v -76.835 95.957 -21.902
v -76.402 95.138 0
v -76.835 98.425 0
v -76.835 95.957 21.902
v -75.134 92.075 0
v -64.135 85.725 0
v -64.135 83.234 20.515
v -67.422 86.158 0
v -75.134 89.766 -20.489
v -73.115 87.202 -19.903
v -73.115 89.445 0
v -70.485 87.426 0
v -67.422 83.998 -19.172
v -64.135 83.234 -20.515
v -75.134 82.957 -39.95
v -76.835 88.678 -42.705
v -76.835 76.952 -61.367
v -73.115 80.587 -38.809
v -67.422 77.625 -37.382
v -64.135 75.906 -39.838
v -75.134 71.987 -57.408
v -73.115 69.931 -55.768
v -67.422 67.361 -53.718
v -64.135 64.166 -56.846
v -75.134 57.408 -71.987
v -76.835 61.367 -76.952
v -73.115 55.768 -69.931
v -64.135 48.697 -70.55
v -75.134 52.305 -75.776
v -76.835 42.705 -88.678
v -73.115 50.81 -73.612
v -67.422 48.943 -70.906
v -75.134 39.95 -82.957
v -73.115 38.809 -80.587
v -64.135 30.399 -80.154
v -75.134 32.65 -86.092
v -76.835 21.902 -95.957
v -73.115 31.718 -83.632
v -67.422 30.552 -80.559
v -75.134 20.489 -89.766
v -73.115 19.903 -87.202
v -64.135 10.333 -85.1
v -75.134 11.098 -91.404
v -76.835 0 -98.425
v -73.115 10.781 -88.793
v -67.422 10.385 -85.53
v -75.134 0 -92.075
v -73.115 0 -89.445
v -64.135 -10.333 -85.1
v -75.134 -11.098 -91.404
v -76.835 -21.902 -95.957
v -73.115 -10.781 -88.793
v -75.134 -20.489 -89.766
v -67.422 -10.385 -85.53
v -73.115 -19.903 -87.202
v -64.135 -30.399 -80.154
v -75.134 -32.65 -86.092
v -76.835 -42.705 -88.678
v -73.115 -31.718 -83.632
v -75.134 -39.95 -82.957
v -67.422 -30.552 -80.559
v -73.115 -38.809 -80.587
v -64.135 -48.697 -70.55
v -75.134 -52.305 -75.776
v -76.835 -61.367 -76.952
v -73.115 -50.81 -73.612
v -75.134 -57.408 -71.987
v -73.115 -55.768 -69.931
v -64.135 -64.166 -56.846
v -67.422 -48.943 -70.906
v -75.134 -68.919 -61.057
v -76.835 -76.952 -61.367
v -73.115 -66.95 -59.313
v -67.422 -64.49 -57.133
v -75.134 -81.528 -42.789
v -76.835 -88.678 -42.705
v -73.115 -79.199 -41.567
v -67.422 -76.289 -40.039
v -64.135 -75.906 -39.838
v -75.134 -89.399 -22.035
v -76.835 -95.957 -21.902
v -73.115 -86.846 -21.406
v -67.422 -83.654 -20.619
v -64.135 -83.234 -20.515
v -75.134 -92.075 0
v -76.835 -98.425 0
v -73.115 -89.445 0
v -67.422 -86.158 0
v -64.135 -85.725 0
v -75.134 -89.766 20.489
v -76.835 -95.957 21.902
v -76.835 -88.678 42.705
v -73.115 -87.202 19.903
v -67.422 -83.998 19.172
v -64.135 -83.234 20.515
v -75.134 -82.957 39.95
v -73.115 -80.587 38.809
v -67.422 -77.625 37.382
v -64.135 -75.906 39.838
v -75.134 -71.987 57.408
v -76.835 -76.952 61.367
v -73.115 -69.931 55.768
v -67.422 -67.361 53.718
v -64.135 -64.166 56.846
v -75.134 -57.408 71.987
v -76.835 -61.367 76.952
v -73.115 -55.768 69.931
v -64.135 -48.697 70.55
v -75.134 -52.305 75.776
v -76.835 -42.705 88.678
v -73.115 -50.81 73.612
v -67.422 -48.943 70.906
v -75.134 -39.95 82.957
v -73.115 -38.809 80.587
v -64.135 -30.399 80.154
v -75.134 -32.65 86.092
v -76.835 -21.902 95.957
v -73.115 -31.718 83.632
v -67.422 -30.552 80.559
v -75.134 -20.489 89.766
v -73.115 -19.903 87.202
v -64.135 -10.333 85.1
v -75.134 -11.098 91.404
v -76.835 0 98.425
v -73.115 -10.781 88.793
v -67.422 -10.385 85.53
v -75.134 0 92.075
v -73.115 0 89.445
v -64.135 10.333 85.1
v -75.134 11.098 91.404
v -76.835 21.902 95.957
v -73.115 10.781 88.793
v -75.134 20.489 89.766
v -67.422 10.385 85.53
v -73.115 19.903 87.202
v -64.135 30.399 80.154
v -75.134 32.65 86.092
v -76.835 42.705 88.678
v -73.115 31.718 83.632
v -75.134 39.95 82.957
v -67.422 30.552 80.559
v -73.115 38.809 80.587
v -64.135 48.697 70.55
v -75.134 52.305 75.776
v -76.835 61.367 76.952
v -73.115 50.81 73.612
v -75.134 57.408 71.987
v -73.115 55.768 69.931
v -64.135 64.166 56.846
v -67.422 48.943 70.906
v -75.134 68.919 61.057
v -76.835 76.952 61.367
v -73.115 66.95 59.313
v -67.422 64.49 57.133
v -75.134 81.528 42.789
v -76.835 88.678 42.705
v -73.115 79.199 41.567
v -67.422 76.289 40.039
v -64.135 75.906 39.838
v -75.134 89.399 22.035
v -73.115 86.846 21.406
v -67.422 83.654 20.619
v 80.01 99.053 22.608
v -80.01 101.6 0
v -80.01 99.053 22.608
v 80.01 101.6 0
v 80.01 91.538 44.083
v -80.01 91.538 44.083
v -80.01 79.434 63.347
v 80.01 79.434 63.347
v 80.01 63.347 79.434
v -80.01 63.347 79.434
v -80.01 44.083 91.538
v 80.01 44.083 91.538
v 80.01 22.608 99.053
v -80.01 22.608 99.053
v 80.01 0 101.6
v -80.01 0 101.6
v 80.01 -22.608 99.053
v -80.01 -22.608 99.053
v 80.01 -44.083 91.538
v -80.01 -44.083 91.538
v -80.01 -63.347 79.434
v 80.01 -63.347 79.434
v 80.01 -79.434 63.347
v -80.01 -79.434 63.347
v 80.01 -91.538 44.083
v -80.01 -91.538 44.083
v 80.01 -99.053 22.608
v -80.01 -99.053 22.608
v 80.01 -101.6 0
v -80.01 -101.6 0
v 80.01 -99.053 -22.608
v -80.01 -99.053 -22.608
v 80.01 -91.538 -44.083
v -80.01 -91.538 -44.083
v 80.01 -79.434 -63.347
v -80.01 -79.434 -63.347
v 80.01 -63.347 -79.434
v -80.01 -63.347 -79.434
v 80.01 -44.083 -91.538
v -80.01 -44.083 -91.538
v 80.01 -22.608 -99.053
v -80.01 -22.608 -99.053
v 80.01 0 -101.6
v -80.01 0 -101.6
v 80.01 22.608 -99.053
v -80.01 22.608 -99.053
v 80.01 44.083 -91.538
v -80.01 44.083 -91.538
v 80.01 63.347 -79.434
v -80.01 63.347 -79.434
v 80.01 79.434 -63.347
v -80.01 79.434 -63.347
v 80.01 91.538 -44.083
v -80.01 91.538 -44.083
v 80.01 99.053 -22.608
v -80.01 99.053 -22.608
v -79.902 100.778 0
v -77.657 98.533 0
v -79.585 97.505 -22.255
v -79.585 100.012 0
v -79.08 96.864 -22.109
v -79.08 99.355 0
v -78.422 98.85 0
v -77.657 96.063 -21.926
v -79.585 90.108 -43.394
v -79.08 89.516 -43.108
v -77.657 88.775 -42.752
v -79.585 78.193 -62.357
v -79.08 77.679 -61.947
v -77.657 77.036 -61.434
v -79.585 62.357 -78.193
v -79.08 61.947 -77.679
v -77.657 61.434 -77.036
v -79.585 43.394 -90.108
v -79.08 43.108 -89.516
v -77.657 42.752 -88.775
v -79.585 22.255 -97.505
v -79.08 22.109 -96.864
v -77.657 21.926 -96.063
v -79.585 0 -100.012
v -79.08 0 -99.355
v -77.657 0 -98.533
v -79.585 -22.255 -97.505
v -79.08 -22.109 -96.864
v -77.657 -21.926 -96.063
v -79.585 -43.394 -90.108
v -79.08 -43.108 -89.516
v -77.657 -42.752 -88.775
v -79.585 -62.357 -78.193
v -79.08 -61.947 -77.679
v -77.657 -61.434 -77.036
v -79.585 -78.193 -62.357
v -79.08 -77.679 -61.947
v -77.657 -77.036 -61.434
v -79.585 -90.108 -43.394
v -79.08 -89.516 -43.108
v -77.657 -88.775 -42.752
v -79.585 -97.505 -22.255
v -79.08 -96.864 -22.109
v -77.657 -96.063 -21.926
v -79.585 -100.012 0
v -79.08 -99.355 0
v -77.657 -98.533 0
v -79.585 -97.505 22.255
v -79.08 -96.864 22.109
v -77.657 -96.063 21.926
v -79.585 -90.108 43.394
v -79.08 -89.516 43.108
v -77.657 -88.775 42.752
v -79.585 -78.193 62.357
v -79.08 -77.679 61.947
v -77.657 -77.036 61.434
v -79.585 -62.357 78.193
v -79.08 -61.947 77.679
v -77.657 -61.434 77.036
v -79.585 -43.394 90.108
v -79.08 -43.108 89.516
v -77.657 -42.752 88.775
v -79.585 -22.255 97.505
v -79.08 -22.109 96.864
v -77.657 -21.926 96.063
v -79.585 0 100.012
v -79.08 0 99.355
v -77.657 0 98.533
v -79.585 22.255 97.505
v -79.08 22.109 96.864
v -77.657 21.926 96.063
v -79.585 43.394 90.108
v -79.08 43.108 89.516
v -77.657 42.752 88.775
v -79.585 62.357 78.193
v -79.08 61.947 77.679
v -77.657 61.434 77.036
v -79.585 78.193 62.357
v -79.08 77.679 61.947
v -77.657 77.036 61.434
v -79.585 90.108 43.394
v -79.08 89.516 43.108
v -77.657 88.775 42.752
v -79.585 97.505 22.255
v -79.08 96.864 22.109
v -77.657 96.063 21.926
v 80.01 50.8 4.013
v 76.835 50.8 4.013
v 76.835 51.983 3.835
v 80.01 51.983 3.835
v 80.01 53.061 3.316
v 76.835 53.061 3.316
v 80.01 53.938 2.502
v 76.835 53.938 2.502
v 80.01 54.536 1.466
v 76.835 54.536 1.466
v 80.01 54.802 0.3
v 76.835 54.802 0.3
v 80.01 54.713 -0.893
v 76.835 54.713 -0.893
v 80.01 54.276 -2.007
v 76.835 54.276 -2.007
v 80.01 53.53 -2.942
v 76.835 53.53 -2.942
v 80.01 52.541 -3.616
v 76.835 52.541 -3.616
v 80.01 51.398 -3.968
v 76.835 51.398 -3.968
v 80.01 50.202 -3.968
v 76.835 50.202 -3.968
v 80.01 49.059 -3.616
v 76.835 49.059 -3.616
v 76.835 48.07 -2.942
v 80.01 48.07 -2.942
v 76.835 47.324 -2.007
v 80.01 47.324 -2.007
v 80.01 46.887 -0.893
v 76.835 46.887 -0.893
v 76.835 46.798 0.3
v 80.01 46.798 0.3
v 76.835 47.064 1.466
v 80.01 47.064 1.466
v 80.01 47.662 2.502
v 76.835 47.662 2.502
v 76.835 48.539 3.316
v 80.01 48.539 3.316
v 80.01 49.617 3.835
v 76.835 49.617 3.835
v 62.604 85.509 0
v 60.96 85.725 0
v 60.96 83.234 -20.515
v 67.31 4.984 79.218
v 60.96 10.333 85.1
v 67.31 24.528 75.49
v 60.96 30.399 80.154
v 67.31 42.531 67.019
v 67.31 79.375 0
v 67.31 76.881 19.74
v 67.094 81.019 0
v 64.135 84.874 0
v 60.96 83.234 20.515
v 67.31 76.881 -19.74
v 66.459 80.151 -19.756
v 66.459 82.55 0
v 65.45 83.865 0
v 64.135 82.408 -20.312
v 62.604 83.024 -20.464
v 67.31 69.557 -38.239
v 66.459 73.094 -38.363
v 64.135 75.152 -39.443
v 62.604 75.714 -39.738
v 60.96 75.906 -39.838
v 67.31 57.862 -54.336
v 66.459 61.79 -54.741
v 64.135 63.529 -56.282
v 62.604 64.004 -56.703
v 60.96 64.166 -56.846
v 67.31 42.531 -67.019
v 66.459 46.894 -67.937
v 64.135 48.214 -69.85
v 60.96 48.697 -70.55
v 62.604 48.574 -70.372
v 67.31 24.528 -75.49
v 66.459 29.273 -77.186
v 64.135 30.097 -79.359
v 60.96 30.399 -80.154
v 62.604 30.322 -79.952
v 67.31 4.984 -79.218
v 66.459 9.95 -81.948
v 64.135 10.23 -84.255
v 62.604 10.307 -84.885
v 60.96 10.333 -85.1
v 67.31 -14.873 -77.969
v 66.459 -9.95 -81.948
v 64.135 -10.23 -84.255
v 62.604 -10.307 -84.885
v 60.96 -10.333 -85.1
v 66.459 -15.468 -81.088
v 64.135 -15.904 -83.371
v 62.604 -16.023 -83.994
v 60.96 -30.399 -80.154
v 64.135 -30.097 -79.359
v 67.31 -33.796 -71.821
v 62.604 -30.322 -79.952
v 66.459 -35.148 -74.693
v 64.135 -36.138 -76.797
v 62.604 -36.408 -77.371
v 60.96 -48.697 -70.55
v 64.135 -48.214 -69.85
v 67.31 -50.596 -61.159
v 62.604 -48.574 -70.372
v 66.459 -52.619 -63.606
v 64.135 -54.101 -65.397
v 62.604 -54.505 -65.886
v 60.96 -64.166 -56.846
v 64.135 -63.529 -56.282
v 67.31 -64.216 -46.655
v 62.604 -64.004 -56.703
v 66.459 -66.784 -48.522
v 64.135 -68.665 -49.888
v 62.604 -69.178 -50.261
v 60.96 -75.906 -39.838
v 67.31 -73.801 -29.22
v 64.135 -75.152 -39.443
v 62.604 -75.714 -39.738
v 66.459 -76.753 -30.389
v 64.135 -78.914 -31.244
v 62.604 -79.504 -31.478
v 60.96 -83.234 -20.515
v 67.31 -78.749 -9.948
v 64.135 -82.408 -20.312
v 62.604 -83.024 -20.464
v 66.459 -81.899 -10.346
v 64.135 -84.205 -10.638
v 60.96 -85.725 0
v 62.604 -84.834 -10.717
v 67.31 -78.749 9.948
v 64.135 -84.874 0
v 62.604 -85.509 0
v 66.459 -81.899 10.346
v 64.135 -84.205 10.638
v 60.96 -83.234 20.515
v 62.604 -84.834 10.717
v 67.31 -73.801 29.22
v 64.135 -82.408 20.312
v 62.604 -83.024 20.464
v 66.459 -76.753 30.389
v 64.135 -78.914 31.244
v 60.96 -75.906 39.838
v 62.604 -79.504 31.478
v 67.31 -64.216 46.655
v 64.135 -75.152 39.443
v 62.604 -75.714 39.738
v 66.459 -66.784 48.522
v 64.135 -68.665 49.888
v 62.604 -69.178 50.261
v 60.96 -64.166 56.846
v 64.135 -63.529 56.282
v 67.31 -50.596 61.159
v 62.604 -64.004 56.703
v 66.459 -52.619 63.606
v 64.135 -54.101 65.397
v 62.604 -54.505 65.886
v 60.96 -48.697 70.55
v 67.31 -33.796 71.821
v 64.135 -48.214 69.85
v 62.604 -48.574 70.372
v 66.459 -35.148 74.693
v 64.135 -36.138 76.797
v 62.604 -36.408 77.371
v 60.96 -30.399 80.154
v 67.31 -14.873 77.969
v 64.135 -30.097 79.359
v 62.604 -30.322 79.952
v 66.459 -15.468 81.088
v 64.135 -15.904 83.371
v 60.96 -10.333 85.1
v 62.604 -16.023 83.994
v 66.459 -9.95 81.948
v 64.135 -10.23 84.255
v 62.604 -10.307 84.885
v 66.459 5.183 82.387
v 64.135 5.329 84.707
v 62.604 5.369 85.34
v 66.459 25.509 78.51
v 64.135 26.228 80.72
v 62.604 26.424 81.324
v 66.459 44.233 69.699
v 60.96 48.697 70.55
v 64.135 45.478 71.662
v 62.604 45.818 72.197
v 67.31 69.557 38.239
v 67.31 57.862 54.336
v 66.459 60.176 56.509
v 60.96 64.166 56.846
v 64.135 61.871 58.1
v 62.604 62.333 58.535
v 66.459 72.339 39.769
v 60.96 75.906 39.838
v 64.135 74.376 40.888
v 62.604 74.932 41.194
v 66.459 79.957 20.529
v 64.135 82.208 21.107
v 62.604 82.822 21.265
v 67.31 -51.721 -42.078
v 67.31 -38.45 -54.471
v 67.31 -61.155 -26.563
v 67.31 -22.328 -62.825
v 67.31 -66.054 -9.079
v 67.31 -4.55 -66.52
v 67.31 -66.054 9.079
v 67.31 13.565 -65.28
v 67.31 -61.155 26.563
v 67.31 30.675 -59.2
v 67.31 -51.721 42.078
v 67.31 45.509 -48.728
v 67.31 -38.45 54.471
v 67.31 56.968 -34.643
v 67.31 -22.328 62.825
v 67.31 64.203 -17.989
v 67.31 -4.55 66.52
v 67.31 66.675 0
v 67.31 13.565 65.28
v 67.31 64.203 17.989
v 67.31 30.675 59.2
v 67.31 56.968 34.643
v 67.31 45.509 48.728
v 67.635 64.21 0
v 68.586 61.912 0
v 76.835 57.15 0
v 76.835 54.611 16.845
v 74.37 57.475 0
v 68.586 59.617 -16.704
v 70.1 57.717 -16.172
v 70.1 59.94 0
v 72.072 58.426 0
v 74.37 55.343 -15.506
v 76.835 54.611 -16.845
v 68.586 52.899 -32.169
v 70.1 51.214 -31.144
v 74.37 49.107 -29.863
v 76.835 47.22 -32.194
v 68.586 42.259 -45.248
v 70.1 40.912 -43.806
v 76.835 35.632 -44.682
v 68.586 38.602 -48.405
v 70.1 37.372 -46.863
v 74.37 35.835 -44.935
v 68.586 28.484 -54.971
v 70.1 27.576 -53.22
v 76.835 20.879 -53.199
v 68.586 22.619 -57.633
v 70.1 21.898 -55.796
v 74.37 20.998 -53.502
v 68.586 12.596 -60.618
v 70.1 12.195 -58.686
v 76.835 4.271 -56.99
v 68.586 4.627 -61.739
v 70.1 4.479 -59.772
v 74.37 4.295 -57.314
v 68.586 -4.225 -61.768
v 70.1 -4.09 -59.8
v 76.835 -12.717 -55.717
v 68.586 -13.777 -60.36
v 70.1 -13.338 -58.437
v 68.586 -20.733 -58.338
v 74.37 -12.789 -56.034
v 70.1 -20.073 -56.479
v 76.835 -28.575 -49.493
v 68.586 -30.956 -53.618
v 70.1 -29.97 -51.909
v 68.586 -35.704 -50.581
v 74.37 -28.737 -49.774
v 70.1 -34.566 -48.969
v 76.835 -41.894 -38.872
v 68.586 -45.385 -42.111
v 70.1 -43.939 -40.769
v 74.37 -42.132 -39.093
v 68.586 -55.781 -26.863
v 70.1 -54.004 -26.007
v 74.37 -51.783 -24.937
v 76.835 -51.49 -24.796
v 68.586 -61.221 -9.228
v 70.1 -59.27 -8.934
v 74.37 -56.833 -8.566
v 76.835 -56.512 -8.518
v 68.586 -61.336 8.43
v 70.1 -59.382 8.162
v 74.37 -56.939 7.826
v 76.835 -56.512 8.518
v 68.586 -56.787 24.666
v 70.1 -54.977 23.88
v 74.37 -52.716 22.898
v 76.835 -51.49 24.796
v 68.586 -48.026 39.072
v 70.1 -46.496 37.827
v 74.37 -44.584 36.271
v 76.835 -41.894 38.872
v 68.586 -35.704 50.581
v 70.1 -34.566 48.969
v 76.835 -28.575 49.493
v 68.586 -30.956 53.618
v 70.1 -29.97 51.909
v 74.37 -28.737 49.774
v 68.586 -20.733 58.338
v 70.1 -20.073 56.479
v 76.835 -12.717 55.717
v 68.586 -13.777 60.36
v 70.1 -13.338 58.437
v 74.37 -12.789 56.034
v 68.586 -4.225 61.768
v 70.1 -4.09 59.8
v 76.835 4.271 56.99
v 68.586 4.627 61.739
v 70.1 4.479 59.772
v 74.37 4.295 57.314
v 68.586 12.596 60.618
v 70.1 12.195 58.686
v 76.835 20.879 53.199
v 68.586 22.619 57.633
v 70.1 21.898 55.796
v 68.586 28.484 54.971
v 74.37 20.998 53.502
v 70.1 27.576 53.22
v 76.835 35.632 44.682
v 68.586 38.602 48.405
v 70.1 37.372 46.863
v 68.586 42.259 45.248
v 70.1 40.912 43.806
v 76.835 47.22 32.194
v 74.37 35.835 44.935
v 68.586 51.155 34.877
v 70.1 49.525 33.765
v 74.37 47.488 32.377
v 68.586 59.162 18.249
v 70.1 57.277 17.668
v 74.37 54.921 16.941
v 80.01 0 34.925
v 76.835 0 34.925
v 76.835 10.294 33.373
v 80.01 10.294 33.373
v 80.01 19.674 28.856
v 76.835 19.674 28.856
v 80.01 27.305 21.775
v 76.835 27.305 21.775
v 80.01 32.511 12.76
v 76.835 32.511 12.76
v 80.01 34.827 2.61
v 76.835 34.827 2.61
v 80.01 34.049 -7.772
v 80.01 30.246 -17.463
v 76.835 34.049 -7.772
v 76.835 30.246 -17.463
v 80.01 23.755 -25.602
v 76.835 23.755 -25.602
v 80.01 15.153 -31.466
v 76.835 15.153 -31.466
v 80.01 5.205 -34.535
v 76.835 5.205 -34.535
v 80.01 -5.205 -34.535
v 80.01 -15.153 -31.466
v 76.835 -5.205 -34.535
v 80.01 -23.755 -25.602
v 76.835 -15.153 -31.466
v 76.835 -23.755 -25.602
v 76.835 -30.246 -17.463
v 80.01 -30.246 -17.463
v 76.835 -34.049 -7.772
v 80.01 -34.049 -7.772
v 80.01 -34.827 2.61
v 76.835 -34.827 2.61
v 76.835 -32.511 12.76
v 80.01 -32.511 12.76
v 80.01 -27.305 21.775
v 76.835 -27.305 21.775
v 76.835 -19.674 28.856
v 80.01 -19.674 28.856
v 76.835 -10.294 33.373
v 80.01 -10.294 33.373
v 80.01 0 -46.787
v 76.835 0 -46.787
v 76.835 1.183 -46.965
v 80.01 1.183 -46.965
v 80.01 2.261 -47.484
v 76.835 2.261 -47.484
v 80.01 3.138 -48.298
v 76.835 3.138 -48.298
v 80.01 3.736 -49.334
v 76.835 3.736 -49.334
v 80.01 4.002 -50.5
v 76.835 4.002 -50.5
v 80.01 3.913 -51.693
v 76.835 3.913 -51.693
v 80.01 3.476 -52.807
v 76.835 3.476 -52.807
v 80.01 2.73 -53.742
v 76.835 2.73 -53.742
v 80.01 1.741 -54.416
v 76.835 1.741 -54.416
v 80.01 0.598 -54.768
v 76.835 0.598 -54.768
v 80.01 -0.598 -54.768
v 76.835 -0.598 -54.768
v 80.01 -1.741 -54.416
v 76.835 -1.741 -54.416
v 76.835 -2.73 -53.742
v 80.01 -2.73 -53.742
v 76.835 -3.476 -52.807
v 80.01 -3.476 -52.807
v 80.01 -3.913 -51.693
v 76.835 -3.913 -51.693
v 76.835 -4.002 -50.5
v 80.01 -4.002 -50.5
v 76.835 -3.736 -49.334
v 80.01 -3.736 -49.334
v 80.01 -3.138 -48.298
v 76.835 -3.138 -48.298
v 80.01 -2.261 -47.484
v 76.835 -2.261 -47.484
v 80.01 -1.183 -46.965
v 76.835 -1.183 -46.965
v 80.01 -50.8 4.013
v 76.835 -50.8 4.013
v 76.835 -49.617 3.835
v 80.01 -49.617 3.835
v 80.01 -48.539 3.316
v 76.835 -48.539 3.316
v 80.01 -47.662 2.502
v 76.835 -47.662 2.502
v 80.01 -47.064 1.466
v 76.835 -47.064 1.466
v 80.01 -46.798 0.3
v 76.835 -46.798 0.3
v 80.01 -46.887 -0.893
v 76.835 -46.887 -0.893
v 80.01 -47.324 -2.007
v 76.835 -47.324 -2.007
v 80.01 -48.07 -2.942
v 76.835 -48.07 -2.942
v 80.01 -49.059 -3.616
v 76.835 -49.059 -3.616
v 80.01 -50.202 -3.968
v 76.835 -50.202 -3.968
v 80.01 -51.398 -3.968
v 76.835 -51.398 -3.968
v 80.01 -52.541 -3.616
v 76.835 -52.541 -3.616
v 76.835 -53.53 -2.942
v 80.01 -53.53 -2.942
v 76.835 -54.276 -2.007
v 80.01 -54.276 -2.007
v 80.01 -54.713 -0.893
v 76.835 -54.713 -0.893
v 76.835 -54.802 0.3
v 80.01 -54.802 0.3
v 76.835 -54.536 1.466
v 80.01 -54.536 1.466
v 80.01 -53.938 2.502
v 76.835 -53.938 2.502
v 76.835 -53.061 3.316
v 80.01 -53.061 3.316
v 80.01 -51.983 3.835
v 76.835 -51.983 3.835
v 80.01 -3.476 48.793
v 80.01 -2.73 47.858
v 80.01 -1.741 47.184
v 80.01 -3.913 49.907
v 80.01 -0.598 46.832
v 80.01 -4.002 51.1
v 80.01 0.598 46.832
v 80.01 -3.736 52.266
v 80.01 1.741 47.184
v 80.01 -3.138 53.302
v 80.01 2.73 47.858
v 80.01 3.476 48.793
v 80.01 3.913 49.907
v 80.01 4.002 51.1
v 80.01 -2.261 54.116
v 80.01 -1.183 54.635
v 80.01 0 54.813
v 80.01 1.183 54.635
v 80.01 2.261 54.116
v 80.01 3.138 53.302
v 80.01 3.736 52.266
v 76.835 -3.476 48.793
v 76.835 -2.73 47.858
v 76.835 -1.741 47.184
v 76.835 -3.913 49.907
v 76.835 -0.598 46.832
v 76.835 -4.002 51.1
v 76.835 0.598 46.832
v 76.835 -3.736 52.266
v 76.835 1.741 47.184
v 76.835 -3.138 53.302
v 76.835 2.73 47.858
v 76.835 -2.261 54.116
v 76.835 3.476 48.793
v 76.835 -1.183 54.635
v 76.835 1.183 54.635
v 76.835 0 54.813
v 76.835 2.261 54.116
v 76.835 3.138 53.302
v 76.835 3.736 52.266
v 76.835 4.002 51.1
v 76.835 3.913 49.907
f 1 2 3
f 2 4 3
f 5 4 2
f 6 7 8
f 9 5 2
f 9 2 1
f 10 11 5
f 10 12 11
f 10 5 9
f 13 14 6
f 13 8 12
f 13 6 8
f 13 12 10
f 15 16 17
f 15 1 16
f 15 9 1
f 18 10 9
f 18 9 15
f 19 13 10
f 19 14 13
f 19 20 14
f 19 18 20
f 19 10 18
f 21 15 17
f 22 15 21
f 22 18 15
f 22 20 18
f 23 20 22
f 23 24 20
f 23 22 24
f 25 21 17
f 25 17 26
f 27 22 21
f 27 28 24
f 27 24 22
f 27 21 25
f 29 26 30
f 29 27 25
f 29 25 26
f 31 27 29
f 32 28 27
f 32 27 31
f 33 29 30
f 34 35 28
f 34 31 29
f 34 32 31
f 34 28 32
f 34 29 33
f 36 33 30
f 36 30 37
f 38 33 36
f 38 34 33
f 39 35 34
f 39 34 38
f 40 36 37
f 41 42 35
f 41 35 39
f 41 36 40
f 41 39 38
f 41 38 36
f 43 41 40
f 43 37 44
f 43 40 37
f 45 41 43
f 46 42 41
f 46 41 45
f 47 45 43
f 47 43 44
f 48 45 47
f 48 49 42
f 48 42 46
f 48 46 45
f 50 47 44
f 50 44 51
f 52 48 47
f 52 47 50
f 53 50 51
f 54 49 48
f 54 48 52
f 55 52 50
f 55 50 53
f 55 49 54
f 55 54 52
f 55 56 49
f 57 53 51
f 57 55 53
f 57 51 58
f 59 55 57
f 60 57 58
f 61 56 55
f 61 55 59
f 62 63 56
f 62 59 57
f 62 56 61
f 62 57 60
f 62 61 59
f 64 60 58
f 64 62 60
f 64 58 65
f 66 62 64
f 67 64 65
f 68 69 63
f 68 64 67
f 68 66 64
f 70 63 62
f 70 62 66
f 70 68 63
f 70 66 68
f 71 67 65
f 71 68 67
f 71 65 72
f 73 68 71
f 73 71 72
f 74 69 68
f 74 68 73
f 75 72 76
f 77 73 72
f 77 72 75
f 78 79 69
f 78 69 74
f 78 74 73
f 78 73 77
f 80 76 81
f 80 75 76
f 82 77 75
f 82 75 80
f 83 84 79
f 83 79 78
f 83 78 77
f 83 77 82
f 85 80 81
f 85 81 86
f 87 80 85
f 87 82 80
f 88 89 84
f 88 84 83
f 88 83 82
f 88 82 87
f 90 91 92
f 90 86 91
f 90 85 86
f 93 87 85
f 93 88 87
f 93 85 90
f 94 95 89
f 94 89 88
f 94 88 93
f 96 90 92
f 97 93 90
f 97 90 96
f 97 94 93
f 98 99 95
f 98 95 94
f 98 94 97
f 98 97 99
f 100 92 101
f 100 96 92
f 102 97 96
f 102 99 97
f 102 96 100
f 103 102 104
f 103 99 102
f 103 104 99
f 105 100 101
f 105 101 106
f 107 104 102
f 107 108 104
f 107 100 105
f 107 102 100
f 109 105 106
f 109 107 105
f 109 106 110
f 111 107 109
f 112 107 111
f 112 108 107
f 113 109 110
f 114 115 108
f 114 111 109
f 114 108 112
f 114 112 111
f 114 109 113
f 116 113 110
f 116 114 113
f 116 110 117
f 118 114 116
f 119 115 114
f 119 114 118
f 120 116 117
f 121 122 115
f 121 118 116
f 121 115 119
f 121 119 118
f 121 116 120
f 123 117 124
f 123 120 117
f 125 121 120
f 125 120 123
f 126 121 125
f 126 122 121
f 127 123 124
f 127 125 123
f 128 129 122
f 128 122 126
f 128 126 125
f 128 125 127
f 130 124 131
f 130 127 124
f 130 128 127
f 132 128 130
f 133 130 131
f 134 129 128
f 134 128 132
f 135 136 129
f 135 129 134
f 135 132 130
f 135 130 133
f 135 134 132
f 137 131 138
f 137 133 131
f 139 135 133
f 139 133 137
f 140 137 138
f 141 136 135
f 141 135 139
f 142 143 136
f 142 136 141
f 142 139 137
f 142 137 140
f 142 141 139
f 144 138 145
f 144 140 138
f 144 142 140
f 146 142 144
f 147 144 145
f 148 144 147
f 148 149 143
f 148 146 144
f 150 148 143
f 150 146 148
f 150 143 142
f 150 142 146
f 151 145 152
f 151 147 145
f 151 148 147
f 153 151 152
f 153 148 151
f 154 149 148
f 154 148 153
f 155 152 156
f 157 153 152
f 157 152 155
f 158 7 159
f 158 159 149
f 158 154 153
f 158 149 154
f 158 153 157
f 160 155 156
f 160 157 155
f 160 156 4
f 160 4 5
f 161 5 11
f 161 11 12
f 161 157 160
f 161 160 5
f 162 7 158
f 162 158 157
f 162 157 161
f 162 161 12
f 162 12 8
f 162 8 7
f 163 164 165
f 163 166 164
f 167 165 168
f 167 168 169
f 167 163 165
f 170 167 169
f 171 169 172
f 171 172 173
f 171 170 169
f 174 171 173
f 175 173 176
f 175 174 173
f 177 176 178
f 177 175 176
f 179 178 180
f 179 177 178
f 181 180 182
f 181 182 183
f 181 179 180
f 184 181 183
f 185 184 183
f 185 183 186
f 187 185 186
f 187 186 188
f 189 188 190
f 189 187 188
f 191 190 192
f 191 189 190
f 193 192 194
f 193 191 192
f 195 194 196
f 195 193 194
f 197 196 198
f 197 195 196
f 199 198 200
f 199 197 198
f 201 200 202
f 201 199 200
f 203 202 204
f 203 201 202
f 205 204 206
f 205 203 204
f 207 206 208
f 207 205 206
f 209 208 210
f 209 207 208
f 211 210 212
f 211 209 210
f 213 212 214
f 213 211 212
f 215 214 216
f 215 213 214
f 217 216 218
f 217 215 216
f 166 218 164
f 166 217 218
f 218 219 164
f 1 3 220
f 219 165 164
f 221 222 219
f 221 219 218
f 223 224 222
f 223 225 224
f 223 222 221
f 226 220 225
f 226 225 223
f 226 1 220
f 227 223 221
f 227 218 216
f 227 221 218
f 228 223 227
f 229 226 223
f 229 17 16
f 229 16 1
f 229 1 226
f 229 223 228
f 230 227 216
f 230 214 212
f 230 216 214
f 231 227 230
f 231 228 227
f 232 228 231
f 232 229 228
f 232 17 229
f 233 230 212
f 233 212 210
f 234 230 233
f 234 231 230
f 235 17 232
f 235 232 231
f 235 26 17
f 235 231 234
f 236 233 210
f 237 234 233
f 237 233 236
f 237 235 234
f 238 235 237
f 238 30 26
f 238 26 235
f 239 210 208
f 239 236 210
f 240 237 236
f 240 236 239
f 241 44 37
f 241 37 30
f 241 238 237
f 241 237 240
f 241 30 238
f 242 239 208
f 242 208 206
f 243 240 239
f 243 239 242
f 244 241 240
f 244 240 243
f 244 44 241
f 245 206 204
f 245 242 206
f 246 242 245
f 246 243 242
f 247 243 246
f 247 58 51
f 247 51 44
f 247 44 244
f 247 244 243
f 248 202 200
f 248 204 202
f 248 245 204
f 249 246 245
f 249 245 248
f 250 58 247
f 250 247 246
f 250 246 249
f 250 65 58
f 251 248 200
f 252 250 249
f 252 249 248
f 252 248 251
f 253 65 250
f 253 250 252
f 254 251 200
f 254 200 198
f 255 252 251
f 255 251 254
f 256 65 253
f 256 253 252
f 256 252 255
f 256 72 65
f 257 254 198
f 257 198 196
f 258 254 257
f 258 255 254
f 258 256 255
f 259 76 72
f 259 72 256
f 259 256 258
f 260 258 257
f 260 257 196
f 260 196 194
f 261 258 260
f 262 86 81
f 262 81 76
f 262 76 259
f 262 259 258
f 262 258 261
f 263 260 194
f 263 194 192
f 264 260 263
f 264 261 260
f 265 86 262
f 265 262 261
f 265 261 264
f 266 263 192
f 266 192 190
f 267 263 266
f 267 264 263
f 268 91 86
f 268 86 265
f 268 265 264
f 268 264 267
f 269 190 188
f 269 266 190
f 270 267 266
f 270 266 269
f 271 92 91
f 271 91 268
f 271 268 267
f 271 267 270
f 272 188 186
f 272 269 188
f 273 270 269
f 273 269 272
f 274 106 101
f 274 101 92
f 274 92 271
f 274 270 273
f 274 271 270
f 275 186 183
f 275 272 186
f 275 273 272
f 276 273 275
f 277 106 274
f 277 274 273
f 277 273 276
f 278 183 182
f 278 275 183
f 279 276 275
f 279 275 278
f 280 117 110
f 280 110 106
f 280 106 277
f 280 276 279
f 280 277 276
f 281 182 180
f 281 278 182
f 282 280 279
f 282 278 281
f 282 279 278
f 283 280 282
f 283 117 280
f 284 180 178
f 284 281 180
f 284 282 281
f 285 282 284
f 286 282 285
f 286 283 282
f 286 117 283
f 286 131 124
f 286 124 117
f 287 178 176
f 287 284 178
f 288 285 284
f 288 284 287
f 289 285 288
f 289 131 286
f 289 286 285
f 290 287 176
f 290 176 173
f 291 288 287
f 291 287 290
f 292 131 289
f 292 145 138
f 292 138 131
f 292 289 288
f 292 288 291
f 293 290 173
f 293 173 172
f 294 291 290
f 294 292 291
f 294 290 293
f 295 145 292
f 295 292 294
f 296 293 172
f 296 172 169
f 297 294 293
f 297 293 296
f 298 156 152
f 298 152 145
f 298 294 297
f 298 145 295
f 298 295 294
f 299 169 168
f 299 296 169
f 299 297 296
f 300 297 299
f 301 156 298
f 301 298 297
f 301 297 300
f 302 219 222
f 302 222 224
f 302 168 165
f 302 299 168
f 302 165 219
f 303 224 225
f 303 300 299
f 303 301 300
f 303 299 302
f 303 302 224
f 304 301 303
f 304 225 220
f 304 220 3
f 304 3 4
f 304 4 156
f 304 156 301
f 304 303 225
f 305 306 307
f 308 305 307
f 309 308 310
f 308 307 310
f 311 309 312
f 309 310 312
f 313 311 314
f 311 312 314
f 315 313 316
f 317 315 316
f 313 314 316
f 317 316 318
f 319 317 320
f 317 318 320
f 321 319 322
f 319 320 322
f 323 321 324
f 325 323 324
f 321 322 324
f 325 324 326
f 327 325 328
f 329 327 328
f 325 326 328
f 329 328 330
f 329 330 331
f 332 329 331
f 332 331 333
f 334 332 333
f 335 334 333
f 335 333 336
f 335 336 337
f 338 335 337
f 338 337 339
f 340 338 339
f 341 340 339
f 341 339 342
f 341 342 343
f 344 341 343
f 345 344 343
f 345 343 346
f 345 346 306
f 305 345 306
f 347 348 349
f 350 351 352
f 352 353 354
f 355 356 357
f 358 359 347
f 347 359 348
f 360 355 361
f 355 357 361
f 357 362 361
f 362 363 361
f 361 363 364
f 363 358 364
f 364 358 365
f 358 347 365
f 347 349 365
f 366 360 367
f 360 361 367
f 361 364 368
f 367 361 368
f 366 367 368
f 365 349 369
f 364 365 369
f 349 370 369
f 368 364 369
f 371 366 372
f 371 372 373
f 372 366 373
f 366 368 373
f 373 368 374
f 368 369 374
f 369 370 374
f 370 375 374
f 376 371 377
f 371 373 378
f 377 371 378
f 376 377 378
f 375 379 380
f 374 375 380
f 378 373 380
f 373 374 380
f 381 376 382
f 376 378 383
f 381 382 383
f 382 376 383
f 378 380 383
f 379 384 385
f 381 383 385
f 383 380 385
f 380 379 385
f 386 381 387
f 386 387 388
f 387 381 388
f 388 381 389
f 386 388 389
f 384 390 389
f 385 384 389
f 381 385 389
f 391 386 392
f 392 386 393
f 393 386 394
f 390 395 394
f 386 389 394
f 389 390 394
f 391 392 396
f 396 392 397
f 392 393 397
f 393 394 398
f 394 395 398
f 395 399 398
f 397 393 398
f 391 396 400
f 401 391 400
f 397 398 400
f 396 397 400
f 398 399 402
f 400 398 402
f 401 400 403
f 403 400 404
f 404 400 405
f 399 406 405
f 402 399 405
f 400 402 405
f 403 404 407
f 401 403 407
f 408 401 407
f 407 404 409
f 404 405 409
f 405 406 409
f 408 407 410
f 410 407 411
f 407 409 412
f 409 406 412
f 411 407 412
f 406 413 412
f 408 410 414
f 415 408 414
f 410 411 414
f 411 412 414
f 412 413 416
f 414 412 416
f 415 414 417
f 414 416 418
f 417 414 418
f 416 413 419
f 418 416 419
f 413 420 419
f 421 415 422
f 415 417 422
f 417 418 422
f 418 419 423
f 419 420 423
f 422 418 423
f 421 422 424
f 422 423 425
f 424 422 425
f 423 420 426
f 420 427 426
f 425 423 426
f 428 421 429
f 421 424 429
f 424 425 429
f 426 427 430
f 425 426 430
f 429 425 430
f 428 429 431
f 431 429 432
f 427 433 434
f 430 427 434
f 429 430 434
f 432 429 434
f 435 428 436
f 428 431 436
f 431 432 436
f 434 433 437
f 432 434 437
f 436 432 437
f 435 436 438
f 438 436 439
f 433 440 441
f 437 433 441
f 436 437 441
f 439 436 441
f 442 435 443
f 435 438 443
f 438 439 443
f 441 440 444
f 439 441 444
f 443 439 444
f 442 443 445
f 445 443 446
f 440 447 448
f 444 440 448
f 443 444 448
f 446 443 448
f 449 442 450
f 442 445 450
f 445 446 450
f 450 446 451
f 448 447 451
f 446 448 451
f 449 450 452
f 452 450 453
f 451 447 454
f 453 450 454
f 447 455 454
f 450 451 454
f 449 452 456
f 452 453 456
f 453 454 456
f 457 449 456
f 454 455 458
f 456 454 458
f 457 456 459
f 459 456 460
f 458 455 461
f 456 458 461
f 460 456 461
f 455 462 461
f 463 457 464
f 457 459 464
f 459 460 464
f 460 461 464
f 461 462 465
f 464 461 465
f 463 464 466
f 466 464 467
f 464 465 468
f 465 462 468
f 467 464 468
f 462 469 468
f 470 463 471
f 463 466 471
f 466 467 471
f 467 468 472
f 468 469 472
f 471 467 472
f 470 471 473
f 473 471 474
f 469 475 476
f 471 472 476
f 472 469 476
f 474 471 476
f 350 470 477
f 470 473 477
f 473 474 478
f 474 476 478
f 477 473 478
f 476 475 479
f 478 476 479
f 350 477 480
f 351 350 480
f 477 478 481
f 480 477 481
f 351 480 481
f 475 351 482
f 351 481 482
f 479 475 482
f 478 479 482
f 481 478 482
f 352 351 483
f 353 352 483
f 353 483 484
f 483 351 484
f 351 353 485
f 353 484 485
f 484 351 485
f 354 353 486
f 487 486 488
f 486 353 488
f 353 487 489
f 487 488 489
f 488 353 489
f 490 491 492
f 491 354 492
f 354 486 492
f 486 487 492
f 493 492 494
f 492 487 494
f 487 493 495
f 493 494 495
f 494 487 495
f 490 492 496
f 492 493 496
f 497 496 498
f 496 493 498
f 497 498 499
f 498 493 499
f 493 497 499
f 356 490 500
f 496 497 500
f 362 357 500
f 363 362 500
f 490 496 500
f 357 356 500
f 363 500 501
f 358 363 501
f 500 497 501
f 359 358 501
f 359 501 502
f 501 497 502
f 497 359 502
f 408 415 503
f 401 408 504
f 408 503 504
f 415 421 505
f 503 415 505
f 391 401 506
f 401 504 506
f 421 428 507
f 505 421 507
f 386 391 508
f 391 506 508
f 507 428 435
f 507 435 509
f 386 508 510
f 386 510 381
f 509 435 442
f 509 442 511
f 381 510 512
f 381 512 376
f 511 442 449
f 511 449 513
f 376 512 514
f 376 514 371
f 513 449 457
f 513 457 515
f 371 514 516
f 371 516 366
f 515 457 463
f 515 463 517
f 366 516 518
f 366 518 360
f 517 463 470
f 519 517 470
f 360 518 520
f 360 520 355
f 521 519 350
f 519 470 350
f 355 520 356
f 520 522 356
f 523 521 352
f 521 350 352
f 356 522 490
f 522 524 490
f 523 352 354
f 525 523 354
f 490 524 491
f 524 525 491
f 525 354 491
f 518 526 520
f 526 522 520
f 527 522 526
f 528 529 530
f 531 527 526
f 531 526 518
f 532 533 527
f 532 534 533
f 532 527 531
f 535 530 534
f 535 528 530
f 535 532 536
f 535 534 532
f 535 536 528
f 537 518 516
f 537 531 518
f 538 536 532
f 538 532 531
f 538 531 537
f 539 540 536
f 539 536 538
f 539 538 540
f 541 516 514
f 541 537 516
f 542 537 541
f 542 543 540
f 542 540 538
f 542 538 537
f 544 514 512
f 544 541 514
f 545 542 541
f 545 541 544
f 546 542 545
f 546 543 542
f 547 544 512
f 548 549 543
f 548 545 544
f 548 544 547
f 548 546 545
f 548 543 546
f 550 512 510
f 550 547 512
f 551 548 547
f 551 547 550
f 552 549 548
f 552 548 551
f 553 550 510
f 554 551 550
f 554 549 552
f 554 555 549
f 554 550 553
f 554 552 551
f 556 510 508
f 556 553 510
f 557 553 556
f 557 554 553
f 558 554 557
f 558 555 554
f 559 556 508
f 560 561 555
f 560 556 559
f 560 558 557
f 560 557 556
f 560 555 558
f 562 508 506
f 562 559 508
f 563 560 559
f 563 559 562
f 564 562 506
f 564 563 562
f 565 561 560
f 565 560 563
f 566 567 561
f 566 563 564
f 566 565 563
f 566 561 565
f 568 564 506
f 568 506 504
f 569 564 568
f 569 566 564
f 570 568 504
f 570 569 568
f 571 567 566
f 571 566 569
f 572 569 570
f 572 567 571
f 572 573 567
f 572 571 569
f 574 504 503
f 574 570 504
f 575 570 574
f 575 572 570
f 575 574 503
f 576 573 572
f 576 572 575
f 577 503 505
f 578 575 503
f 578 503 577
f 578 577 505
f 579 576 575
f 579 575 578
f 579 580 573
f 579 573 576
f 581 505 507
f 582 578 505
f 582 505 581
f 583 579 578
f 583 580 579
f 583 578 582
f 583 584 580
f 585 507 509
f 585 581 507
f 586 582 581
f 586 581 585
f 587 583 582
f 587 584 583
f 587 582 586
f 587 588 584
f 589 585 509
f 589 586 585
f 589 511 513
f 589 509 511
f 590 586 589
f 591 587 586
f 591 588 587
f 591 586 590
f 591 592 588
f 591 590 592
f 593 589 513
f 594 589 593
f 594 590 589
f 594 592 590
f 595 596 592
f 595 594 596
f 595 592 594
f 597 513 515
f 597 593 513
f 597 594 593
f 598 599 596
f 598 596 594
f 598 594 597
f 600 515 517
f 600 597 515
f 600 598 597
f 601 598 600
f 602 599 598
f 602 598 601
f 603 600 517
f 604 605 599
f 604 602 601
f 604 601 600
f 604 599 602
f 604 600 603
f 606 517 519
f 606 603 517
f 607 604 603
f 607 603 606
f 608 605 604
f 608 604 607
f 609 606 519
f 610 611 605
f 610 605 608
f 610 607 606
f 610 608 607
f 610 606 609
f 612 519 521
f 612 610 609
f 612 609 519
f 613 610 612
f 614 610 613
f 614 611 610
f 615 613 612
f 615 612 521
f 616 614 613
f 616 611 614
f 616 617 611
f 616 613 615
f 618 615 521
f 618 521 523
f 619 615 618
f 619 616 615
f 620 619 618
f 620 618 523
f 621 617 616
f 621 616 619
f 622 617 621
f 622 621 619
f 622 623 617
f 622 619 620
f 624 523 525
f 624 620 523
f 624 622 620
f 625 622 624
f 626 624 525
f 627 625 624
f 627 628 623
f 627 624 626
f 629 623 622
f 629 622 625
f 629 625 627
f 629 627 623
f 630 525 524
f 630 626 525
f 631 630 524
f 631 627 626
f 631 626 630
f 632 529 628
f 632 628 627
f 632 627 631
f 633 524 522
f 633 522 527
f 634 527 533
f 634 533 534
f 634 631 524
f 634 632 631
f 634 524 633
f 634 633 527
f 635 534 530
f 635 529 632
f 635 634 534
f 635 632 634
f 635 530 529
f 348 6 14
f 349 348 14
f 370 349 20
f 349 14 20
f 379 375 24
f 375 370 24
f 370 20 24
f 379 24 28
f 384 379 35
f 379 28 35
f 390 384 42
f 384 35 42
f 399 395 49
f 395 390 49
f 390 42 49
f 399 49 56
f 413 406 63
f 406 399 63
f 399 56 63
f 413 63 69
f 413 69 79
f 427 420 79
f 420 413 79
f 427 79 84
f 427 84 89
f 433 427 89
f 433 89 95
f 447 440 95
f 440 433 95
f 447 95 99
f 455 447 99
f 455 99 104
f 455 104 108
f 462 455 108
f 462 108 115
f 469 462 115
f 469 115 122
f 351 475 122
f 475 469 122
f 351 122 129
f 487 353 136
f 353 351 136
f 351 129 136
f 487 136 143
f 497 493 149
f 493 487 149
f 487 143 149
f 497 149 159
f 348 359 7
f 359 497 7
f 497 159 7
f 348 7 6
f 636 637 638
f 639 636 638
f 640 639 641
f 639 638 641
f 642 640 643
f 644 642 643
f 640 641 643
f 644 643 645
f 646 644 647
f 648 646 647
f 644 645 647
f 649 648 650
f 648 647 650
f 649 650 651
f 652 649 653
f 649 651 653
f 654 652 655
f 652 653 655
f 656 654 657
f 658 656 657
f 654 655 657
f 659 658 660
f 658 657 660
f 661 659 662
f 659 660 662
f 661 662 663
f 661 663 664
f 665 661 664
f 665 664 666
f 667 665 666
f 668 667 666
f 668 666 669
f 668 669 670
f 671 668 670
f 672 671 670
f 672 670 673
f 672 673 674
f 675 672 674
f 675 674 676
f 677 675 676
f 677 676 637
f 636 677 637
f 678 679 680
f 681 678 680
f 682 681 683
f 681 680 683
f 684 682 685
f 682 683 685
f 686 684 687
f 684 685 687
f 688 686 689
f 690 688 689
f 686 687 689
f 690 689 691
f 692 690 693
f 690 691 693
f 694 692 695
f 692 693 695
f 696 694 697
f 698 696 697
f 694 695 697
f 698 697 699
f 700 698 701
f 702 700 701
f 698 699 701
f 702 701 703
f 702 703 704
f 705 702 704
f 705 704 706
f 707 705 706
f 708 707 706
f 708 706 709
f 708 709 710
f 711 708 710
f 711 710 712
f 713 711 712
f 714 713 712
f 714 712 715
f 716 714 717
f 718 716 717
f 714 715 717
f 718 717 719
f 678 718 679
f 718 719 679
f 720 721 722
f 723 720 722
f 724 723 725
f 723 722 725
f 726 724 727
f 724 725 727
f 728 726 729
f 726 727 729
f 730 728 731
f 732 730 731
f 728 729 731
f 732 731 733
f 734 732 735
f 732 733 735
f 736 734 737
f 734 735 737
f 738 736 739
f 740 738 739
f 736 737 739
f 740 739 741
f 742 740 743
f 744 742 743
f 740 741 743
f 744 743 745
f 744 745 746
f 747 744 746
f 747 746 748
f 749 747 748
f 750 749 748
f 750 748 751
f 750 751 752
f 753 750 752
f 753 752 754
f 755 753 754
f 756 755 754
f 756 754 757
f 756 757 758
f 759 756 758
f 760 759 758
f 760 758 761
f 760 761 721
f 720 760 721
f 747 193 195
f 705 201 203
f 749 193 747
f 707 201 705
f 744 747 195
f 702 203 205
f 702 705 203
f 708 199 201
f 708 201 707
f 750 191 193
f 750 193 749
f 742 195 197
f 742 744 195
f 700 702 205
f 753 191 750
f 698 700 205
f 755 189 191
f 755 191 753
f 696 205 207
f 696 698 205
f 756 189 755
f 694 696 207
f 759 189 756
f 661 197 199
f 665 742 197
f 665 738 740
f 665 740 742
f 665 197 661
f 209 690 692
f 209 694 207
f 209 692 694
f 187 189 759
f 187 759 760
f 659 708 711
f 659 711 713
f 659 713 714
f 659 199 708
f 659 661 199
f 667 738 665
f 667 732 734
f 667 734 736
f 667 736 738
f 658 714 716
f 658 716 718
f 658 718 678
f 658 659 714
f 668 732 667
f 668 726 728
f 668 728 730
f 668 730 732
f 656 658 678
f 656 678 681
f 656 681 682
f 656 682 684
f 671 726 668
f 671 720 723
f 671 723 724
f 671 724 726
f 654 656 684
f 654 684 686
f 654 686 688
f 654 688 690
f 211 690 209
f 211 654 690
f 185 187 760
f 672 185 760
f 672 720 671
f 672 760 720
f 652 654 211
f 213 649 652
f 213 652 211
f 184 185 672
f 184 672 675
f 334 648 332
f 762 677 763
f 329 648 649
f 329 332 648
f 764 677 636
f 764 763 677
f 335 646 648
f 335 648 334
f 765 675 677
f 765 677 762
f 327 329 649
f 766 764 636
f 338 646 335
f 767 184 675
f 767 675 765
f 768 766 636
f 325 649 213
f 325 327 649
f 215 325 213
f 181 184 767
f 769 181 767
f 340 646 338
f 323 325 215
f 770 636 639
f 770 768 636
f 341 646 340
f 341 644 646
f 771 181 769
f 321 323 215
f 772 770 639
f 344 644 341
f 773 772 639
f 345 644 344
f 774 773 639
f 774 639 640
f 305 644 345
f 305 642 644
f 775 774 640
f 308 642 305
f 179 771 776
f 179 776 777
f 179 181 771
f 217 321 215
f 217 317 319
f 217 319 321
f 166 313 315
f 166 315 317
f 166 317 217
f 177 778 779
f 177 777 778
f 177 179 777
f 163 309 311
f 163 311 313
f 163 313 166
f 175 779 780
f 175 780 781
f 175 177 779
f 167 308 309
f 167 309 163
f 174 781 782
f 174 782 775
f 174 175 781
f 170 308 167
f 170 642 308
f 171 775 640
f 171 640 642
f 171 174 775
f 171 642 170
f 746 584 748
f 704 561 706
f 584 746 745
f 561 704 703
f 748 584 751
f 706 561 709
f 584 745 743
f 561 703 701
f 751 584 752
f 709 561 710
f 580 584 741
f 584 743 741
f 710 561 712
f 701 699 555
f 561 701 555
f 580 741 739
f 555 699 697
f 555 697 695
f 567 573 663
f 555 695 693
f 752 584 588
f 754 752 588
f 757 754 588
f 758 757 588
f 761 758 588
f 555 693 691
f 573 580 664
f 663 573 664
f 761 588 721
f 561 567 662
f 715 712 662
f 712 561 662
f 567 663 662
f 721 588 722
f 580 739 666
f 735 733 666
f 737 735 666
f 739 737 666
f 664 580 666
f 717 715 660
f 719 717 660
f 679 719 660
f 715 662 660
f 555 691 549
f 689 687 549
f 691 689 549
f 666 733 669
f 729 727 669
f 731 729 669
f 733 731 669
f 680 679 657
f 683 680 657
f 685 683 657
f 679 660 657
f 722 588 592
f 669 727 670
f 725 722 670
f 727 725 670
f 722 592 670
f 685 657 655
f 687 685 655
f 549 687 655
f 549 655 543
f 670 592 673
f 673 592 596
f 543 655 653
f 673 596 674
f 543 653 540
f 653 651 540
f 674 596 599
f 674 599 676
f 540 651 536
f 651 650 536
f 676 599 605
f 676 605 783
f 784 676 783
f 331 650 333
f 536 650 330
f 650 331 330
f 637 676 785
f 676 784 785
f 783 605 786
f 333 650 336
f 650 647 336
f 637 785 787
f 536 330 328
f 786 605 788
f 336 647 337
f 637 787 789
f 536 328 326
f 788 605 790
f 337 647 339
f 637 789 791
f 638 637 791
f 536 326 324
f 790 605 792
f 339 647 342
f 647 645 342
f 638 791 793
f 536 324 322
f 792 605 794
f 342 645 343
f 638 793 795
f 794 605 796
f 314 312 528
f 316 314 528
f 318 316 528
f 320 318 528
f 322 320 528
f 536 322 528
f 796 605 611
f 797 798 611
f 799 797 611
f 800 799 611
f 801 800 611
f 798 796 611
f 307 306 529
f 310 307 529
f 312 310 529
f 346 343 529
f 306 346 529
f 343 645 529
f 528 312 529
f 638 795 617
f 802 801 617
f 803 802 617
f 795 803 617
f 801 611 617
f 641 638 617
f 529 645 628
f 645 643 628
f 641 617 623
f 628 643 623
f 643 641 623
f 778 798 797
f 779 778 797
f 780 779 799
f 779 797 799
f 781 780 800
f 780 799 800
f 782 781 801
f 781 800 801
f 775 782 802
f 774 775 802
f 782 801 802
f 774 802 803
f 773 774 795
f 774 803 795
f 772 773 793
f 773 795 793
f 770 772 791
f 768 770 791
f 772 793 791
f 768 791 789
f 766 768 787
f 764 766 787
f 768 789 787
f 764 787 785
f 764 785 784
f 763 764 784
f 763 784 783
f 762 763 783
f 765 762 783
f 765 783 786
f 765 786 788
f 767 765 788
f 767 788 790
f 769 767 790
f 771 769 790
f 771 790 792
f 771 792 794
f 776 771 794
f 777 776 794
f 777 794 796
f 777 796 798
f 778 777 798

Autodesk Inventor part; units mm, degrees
ref_plane "YZ Plane" through (0, 0, 0) normal (1, 0, 0) x (0, 1, 0)
ref_plane "XZ Plane" through (0, 0, 0) normal (0, 1, 0) x (-1, 0, 0)
ref_plane "XY Plane" through (0, 0, 0) normal (0, 0, 1) x (1, 0, 0)
sketch "Sketch1" plane through (0, 0, 0) normal (0, 0, 1) x (1, 0, 0)
  line L0 (-179.5854, 0) -> (123.2759, 0) projected
  line L1 (0, -20.32) -> (0, 121.92) projected
  line L2 (-80.01, 101.6) -> (80.01, 101.6)
  line L3 (80.01, 50.8) -> (-80.01, 50.8) construction
  line L4 (80.01, 0) -> (-136.3195, 0) construction
  arc A0 (-80.01, 101.6) -> (-76.835, 98.425) centre (-76.835, 101.6) ccw
  line L5 (60.96, 85.725) -> (-64.135, 85.725)
  arc A1 (-76.835, 98.425) -> (-64.135, 85.725) centre (-64.135, 98.425) ccw
  arc A2 (67.31, 66.675) -> (76.835, 57.15) centre (76.835, 66.675) ccw
  arc A3 (67.31, 79.375) -> (60.96, 85.725) centre (60.96, 79.375) ccw
  line L6 (67.31, 79.375) -> (67.31, 66.675)
  line L7 (80.01, 101.6) -> (80.01, 0)
  line L8 (80.01, 98.425) -> (-76.835, 98.425) construction
  line L9 (-64.135, 85.725) -> (-64.135, 101.6) construction
  line L10 (-76.835, 98.425) -> (-76.835, 101.6) construction
  line L11 (60.96, 85.725) -> (80.01, 85.725) construction
  line L12 (67.31, 79.375) -> (80.01, 79.375) construction
  line L13 (60.96, 50.8) -> (60.96, 101.6) construction
  line L14 (67.31, 66.675) -> (80.01, 66.675) construction
  line L15 (76.835, 57.15) -> (76.835, 0)
  line L16 (76.835, 57.15) -> (80.01, 57.15) construction
  line L17 (76.835, 0) -> (80.01, 0)
  point P0 (0, 0)
  point P1 (0, 101.6)
  dimension "d0" = 101.6
  dimension "d2" = 160.02
  dimension "d4" = 50.8
  dimension "d10" = 6.35
  dimension "d11" = 12.7
  dimension "d13" = 3.175
  dimension "d14" = 34.925
  dimension "d15" = 19.05
  dimension "d16" = 12.7
revolve "Revolution1" add sketch "Sketch1" angle 360 about axis through (-10, 0, 0) along (1, 0, 0) contours L15 A2 L6 A3 L5 L1 L2 L7 L0 | L5 A1 A0 L2 L1
sketch "Sketch2" plane through (76.835, 0, 0) normal (-1, 0, 0) x (0, 0, 1)
  circle A0 centre (0, 0) radius 57.15 projected
  circle A1 centre (0, 0) radius 50.8 construction
  circle A2 centre (0, 0) radius 34.925
  circle A3 centre (0, 50.8) radius 4.0132
  circle A4 centre (-50.8, 0) radius 4.0132
  circle A5 centre (0, -50.8) radius 4.0132
  circle A6 centre (50.8, 0) radius 4.0132
  dimension "d18" = 101.6
  dimension "d19" = 69.85
  dimension "d20" = 8.0264
  dimension "d23" = 360
extrude "Extrusion1" cut sketch "Sketch2" against normal through all contours A2 | A3 | A4 | A5 | A6
properties part number "rim_8 in x 6.3 in"
